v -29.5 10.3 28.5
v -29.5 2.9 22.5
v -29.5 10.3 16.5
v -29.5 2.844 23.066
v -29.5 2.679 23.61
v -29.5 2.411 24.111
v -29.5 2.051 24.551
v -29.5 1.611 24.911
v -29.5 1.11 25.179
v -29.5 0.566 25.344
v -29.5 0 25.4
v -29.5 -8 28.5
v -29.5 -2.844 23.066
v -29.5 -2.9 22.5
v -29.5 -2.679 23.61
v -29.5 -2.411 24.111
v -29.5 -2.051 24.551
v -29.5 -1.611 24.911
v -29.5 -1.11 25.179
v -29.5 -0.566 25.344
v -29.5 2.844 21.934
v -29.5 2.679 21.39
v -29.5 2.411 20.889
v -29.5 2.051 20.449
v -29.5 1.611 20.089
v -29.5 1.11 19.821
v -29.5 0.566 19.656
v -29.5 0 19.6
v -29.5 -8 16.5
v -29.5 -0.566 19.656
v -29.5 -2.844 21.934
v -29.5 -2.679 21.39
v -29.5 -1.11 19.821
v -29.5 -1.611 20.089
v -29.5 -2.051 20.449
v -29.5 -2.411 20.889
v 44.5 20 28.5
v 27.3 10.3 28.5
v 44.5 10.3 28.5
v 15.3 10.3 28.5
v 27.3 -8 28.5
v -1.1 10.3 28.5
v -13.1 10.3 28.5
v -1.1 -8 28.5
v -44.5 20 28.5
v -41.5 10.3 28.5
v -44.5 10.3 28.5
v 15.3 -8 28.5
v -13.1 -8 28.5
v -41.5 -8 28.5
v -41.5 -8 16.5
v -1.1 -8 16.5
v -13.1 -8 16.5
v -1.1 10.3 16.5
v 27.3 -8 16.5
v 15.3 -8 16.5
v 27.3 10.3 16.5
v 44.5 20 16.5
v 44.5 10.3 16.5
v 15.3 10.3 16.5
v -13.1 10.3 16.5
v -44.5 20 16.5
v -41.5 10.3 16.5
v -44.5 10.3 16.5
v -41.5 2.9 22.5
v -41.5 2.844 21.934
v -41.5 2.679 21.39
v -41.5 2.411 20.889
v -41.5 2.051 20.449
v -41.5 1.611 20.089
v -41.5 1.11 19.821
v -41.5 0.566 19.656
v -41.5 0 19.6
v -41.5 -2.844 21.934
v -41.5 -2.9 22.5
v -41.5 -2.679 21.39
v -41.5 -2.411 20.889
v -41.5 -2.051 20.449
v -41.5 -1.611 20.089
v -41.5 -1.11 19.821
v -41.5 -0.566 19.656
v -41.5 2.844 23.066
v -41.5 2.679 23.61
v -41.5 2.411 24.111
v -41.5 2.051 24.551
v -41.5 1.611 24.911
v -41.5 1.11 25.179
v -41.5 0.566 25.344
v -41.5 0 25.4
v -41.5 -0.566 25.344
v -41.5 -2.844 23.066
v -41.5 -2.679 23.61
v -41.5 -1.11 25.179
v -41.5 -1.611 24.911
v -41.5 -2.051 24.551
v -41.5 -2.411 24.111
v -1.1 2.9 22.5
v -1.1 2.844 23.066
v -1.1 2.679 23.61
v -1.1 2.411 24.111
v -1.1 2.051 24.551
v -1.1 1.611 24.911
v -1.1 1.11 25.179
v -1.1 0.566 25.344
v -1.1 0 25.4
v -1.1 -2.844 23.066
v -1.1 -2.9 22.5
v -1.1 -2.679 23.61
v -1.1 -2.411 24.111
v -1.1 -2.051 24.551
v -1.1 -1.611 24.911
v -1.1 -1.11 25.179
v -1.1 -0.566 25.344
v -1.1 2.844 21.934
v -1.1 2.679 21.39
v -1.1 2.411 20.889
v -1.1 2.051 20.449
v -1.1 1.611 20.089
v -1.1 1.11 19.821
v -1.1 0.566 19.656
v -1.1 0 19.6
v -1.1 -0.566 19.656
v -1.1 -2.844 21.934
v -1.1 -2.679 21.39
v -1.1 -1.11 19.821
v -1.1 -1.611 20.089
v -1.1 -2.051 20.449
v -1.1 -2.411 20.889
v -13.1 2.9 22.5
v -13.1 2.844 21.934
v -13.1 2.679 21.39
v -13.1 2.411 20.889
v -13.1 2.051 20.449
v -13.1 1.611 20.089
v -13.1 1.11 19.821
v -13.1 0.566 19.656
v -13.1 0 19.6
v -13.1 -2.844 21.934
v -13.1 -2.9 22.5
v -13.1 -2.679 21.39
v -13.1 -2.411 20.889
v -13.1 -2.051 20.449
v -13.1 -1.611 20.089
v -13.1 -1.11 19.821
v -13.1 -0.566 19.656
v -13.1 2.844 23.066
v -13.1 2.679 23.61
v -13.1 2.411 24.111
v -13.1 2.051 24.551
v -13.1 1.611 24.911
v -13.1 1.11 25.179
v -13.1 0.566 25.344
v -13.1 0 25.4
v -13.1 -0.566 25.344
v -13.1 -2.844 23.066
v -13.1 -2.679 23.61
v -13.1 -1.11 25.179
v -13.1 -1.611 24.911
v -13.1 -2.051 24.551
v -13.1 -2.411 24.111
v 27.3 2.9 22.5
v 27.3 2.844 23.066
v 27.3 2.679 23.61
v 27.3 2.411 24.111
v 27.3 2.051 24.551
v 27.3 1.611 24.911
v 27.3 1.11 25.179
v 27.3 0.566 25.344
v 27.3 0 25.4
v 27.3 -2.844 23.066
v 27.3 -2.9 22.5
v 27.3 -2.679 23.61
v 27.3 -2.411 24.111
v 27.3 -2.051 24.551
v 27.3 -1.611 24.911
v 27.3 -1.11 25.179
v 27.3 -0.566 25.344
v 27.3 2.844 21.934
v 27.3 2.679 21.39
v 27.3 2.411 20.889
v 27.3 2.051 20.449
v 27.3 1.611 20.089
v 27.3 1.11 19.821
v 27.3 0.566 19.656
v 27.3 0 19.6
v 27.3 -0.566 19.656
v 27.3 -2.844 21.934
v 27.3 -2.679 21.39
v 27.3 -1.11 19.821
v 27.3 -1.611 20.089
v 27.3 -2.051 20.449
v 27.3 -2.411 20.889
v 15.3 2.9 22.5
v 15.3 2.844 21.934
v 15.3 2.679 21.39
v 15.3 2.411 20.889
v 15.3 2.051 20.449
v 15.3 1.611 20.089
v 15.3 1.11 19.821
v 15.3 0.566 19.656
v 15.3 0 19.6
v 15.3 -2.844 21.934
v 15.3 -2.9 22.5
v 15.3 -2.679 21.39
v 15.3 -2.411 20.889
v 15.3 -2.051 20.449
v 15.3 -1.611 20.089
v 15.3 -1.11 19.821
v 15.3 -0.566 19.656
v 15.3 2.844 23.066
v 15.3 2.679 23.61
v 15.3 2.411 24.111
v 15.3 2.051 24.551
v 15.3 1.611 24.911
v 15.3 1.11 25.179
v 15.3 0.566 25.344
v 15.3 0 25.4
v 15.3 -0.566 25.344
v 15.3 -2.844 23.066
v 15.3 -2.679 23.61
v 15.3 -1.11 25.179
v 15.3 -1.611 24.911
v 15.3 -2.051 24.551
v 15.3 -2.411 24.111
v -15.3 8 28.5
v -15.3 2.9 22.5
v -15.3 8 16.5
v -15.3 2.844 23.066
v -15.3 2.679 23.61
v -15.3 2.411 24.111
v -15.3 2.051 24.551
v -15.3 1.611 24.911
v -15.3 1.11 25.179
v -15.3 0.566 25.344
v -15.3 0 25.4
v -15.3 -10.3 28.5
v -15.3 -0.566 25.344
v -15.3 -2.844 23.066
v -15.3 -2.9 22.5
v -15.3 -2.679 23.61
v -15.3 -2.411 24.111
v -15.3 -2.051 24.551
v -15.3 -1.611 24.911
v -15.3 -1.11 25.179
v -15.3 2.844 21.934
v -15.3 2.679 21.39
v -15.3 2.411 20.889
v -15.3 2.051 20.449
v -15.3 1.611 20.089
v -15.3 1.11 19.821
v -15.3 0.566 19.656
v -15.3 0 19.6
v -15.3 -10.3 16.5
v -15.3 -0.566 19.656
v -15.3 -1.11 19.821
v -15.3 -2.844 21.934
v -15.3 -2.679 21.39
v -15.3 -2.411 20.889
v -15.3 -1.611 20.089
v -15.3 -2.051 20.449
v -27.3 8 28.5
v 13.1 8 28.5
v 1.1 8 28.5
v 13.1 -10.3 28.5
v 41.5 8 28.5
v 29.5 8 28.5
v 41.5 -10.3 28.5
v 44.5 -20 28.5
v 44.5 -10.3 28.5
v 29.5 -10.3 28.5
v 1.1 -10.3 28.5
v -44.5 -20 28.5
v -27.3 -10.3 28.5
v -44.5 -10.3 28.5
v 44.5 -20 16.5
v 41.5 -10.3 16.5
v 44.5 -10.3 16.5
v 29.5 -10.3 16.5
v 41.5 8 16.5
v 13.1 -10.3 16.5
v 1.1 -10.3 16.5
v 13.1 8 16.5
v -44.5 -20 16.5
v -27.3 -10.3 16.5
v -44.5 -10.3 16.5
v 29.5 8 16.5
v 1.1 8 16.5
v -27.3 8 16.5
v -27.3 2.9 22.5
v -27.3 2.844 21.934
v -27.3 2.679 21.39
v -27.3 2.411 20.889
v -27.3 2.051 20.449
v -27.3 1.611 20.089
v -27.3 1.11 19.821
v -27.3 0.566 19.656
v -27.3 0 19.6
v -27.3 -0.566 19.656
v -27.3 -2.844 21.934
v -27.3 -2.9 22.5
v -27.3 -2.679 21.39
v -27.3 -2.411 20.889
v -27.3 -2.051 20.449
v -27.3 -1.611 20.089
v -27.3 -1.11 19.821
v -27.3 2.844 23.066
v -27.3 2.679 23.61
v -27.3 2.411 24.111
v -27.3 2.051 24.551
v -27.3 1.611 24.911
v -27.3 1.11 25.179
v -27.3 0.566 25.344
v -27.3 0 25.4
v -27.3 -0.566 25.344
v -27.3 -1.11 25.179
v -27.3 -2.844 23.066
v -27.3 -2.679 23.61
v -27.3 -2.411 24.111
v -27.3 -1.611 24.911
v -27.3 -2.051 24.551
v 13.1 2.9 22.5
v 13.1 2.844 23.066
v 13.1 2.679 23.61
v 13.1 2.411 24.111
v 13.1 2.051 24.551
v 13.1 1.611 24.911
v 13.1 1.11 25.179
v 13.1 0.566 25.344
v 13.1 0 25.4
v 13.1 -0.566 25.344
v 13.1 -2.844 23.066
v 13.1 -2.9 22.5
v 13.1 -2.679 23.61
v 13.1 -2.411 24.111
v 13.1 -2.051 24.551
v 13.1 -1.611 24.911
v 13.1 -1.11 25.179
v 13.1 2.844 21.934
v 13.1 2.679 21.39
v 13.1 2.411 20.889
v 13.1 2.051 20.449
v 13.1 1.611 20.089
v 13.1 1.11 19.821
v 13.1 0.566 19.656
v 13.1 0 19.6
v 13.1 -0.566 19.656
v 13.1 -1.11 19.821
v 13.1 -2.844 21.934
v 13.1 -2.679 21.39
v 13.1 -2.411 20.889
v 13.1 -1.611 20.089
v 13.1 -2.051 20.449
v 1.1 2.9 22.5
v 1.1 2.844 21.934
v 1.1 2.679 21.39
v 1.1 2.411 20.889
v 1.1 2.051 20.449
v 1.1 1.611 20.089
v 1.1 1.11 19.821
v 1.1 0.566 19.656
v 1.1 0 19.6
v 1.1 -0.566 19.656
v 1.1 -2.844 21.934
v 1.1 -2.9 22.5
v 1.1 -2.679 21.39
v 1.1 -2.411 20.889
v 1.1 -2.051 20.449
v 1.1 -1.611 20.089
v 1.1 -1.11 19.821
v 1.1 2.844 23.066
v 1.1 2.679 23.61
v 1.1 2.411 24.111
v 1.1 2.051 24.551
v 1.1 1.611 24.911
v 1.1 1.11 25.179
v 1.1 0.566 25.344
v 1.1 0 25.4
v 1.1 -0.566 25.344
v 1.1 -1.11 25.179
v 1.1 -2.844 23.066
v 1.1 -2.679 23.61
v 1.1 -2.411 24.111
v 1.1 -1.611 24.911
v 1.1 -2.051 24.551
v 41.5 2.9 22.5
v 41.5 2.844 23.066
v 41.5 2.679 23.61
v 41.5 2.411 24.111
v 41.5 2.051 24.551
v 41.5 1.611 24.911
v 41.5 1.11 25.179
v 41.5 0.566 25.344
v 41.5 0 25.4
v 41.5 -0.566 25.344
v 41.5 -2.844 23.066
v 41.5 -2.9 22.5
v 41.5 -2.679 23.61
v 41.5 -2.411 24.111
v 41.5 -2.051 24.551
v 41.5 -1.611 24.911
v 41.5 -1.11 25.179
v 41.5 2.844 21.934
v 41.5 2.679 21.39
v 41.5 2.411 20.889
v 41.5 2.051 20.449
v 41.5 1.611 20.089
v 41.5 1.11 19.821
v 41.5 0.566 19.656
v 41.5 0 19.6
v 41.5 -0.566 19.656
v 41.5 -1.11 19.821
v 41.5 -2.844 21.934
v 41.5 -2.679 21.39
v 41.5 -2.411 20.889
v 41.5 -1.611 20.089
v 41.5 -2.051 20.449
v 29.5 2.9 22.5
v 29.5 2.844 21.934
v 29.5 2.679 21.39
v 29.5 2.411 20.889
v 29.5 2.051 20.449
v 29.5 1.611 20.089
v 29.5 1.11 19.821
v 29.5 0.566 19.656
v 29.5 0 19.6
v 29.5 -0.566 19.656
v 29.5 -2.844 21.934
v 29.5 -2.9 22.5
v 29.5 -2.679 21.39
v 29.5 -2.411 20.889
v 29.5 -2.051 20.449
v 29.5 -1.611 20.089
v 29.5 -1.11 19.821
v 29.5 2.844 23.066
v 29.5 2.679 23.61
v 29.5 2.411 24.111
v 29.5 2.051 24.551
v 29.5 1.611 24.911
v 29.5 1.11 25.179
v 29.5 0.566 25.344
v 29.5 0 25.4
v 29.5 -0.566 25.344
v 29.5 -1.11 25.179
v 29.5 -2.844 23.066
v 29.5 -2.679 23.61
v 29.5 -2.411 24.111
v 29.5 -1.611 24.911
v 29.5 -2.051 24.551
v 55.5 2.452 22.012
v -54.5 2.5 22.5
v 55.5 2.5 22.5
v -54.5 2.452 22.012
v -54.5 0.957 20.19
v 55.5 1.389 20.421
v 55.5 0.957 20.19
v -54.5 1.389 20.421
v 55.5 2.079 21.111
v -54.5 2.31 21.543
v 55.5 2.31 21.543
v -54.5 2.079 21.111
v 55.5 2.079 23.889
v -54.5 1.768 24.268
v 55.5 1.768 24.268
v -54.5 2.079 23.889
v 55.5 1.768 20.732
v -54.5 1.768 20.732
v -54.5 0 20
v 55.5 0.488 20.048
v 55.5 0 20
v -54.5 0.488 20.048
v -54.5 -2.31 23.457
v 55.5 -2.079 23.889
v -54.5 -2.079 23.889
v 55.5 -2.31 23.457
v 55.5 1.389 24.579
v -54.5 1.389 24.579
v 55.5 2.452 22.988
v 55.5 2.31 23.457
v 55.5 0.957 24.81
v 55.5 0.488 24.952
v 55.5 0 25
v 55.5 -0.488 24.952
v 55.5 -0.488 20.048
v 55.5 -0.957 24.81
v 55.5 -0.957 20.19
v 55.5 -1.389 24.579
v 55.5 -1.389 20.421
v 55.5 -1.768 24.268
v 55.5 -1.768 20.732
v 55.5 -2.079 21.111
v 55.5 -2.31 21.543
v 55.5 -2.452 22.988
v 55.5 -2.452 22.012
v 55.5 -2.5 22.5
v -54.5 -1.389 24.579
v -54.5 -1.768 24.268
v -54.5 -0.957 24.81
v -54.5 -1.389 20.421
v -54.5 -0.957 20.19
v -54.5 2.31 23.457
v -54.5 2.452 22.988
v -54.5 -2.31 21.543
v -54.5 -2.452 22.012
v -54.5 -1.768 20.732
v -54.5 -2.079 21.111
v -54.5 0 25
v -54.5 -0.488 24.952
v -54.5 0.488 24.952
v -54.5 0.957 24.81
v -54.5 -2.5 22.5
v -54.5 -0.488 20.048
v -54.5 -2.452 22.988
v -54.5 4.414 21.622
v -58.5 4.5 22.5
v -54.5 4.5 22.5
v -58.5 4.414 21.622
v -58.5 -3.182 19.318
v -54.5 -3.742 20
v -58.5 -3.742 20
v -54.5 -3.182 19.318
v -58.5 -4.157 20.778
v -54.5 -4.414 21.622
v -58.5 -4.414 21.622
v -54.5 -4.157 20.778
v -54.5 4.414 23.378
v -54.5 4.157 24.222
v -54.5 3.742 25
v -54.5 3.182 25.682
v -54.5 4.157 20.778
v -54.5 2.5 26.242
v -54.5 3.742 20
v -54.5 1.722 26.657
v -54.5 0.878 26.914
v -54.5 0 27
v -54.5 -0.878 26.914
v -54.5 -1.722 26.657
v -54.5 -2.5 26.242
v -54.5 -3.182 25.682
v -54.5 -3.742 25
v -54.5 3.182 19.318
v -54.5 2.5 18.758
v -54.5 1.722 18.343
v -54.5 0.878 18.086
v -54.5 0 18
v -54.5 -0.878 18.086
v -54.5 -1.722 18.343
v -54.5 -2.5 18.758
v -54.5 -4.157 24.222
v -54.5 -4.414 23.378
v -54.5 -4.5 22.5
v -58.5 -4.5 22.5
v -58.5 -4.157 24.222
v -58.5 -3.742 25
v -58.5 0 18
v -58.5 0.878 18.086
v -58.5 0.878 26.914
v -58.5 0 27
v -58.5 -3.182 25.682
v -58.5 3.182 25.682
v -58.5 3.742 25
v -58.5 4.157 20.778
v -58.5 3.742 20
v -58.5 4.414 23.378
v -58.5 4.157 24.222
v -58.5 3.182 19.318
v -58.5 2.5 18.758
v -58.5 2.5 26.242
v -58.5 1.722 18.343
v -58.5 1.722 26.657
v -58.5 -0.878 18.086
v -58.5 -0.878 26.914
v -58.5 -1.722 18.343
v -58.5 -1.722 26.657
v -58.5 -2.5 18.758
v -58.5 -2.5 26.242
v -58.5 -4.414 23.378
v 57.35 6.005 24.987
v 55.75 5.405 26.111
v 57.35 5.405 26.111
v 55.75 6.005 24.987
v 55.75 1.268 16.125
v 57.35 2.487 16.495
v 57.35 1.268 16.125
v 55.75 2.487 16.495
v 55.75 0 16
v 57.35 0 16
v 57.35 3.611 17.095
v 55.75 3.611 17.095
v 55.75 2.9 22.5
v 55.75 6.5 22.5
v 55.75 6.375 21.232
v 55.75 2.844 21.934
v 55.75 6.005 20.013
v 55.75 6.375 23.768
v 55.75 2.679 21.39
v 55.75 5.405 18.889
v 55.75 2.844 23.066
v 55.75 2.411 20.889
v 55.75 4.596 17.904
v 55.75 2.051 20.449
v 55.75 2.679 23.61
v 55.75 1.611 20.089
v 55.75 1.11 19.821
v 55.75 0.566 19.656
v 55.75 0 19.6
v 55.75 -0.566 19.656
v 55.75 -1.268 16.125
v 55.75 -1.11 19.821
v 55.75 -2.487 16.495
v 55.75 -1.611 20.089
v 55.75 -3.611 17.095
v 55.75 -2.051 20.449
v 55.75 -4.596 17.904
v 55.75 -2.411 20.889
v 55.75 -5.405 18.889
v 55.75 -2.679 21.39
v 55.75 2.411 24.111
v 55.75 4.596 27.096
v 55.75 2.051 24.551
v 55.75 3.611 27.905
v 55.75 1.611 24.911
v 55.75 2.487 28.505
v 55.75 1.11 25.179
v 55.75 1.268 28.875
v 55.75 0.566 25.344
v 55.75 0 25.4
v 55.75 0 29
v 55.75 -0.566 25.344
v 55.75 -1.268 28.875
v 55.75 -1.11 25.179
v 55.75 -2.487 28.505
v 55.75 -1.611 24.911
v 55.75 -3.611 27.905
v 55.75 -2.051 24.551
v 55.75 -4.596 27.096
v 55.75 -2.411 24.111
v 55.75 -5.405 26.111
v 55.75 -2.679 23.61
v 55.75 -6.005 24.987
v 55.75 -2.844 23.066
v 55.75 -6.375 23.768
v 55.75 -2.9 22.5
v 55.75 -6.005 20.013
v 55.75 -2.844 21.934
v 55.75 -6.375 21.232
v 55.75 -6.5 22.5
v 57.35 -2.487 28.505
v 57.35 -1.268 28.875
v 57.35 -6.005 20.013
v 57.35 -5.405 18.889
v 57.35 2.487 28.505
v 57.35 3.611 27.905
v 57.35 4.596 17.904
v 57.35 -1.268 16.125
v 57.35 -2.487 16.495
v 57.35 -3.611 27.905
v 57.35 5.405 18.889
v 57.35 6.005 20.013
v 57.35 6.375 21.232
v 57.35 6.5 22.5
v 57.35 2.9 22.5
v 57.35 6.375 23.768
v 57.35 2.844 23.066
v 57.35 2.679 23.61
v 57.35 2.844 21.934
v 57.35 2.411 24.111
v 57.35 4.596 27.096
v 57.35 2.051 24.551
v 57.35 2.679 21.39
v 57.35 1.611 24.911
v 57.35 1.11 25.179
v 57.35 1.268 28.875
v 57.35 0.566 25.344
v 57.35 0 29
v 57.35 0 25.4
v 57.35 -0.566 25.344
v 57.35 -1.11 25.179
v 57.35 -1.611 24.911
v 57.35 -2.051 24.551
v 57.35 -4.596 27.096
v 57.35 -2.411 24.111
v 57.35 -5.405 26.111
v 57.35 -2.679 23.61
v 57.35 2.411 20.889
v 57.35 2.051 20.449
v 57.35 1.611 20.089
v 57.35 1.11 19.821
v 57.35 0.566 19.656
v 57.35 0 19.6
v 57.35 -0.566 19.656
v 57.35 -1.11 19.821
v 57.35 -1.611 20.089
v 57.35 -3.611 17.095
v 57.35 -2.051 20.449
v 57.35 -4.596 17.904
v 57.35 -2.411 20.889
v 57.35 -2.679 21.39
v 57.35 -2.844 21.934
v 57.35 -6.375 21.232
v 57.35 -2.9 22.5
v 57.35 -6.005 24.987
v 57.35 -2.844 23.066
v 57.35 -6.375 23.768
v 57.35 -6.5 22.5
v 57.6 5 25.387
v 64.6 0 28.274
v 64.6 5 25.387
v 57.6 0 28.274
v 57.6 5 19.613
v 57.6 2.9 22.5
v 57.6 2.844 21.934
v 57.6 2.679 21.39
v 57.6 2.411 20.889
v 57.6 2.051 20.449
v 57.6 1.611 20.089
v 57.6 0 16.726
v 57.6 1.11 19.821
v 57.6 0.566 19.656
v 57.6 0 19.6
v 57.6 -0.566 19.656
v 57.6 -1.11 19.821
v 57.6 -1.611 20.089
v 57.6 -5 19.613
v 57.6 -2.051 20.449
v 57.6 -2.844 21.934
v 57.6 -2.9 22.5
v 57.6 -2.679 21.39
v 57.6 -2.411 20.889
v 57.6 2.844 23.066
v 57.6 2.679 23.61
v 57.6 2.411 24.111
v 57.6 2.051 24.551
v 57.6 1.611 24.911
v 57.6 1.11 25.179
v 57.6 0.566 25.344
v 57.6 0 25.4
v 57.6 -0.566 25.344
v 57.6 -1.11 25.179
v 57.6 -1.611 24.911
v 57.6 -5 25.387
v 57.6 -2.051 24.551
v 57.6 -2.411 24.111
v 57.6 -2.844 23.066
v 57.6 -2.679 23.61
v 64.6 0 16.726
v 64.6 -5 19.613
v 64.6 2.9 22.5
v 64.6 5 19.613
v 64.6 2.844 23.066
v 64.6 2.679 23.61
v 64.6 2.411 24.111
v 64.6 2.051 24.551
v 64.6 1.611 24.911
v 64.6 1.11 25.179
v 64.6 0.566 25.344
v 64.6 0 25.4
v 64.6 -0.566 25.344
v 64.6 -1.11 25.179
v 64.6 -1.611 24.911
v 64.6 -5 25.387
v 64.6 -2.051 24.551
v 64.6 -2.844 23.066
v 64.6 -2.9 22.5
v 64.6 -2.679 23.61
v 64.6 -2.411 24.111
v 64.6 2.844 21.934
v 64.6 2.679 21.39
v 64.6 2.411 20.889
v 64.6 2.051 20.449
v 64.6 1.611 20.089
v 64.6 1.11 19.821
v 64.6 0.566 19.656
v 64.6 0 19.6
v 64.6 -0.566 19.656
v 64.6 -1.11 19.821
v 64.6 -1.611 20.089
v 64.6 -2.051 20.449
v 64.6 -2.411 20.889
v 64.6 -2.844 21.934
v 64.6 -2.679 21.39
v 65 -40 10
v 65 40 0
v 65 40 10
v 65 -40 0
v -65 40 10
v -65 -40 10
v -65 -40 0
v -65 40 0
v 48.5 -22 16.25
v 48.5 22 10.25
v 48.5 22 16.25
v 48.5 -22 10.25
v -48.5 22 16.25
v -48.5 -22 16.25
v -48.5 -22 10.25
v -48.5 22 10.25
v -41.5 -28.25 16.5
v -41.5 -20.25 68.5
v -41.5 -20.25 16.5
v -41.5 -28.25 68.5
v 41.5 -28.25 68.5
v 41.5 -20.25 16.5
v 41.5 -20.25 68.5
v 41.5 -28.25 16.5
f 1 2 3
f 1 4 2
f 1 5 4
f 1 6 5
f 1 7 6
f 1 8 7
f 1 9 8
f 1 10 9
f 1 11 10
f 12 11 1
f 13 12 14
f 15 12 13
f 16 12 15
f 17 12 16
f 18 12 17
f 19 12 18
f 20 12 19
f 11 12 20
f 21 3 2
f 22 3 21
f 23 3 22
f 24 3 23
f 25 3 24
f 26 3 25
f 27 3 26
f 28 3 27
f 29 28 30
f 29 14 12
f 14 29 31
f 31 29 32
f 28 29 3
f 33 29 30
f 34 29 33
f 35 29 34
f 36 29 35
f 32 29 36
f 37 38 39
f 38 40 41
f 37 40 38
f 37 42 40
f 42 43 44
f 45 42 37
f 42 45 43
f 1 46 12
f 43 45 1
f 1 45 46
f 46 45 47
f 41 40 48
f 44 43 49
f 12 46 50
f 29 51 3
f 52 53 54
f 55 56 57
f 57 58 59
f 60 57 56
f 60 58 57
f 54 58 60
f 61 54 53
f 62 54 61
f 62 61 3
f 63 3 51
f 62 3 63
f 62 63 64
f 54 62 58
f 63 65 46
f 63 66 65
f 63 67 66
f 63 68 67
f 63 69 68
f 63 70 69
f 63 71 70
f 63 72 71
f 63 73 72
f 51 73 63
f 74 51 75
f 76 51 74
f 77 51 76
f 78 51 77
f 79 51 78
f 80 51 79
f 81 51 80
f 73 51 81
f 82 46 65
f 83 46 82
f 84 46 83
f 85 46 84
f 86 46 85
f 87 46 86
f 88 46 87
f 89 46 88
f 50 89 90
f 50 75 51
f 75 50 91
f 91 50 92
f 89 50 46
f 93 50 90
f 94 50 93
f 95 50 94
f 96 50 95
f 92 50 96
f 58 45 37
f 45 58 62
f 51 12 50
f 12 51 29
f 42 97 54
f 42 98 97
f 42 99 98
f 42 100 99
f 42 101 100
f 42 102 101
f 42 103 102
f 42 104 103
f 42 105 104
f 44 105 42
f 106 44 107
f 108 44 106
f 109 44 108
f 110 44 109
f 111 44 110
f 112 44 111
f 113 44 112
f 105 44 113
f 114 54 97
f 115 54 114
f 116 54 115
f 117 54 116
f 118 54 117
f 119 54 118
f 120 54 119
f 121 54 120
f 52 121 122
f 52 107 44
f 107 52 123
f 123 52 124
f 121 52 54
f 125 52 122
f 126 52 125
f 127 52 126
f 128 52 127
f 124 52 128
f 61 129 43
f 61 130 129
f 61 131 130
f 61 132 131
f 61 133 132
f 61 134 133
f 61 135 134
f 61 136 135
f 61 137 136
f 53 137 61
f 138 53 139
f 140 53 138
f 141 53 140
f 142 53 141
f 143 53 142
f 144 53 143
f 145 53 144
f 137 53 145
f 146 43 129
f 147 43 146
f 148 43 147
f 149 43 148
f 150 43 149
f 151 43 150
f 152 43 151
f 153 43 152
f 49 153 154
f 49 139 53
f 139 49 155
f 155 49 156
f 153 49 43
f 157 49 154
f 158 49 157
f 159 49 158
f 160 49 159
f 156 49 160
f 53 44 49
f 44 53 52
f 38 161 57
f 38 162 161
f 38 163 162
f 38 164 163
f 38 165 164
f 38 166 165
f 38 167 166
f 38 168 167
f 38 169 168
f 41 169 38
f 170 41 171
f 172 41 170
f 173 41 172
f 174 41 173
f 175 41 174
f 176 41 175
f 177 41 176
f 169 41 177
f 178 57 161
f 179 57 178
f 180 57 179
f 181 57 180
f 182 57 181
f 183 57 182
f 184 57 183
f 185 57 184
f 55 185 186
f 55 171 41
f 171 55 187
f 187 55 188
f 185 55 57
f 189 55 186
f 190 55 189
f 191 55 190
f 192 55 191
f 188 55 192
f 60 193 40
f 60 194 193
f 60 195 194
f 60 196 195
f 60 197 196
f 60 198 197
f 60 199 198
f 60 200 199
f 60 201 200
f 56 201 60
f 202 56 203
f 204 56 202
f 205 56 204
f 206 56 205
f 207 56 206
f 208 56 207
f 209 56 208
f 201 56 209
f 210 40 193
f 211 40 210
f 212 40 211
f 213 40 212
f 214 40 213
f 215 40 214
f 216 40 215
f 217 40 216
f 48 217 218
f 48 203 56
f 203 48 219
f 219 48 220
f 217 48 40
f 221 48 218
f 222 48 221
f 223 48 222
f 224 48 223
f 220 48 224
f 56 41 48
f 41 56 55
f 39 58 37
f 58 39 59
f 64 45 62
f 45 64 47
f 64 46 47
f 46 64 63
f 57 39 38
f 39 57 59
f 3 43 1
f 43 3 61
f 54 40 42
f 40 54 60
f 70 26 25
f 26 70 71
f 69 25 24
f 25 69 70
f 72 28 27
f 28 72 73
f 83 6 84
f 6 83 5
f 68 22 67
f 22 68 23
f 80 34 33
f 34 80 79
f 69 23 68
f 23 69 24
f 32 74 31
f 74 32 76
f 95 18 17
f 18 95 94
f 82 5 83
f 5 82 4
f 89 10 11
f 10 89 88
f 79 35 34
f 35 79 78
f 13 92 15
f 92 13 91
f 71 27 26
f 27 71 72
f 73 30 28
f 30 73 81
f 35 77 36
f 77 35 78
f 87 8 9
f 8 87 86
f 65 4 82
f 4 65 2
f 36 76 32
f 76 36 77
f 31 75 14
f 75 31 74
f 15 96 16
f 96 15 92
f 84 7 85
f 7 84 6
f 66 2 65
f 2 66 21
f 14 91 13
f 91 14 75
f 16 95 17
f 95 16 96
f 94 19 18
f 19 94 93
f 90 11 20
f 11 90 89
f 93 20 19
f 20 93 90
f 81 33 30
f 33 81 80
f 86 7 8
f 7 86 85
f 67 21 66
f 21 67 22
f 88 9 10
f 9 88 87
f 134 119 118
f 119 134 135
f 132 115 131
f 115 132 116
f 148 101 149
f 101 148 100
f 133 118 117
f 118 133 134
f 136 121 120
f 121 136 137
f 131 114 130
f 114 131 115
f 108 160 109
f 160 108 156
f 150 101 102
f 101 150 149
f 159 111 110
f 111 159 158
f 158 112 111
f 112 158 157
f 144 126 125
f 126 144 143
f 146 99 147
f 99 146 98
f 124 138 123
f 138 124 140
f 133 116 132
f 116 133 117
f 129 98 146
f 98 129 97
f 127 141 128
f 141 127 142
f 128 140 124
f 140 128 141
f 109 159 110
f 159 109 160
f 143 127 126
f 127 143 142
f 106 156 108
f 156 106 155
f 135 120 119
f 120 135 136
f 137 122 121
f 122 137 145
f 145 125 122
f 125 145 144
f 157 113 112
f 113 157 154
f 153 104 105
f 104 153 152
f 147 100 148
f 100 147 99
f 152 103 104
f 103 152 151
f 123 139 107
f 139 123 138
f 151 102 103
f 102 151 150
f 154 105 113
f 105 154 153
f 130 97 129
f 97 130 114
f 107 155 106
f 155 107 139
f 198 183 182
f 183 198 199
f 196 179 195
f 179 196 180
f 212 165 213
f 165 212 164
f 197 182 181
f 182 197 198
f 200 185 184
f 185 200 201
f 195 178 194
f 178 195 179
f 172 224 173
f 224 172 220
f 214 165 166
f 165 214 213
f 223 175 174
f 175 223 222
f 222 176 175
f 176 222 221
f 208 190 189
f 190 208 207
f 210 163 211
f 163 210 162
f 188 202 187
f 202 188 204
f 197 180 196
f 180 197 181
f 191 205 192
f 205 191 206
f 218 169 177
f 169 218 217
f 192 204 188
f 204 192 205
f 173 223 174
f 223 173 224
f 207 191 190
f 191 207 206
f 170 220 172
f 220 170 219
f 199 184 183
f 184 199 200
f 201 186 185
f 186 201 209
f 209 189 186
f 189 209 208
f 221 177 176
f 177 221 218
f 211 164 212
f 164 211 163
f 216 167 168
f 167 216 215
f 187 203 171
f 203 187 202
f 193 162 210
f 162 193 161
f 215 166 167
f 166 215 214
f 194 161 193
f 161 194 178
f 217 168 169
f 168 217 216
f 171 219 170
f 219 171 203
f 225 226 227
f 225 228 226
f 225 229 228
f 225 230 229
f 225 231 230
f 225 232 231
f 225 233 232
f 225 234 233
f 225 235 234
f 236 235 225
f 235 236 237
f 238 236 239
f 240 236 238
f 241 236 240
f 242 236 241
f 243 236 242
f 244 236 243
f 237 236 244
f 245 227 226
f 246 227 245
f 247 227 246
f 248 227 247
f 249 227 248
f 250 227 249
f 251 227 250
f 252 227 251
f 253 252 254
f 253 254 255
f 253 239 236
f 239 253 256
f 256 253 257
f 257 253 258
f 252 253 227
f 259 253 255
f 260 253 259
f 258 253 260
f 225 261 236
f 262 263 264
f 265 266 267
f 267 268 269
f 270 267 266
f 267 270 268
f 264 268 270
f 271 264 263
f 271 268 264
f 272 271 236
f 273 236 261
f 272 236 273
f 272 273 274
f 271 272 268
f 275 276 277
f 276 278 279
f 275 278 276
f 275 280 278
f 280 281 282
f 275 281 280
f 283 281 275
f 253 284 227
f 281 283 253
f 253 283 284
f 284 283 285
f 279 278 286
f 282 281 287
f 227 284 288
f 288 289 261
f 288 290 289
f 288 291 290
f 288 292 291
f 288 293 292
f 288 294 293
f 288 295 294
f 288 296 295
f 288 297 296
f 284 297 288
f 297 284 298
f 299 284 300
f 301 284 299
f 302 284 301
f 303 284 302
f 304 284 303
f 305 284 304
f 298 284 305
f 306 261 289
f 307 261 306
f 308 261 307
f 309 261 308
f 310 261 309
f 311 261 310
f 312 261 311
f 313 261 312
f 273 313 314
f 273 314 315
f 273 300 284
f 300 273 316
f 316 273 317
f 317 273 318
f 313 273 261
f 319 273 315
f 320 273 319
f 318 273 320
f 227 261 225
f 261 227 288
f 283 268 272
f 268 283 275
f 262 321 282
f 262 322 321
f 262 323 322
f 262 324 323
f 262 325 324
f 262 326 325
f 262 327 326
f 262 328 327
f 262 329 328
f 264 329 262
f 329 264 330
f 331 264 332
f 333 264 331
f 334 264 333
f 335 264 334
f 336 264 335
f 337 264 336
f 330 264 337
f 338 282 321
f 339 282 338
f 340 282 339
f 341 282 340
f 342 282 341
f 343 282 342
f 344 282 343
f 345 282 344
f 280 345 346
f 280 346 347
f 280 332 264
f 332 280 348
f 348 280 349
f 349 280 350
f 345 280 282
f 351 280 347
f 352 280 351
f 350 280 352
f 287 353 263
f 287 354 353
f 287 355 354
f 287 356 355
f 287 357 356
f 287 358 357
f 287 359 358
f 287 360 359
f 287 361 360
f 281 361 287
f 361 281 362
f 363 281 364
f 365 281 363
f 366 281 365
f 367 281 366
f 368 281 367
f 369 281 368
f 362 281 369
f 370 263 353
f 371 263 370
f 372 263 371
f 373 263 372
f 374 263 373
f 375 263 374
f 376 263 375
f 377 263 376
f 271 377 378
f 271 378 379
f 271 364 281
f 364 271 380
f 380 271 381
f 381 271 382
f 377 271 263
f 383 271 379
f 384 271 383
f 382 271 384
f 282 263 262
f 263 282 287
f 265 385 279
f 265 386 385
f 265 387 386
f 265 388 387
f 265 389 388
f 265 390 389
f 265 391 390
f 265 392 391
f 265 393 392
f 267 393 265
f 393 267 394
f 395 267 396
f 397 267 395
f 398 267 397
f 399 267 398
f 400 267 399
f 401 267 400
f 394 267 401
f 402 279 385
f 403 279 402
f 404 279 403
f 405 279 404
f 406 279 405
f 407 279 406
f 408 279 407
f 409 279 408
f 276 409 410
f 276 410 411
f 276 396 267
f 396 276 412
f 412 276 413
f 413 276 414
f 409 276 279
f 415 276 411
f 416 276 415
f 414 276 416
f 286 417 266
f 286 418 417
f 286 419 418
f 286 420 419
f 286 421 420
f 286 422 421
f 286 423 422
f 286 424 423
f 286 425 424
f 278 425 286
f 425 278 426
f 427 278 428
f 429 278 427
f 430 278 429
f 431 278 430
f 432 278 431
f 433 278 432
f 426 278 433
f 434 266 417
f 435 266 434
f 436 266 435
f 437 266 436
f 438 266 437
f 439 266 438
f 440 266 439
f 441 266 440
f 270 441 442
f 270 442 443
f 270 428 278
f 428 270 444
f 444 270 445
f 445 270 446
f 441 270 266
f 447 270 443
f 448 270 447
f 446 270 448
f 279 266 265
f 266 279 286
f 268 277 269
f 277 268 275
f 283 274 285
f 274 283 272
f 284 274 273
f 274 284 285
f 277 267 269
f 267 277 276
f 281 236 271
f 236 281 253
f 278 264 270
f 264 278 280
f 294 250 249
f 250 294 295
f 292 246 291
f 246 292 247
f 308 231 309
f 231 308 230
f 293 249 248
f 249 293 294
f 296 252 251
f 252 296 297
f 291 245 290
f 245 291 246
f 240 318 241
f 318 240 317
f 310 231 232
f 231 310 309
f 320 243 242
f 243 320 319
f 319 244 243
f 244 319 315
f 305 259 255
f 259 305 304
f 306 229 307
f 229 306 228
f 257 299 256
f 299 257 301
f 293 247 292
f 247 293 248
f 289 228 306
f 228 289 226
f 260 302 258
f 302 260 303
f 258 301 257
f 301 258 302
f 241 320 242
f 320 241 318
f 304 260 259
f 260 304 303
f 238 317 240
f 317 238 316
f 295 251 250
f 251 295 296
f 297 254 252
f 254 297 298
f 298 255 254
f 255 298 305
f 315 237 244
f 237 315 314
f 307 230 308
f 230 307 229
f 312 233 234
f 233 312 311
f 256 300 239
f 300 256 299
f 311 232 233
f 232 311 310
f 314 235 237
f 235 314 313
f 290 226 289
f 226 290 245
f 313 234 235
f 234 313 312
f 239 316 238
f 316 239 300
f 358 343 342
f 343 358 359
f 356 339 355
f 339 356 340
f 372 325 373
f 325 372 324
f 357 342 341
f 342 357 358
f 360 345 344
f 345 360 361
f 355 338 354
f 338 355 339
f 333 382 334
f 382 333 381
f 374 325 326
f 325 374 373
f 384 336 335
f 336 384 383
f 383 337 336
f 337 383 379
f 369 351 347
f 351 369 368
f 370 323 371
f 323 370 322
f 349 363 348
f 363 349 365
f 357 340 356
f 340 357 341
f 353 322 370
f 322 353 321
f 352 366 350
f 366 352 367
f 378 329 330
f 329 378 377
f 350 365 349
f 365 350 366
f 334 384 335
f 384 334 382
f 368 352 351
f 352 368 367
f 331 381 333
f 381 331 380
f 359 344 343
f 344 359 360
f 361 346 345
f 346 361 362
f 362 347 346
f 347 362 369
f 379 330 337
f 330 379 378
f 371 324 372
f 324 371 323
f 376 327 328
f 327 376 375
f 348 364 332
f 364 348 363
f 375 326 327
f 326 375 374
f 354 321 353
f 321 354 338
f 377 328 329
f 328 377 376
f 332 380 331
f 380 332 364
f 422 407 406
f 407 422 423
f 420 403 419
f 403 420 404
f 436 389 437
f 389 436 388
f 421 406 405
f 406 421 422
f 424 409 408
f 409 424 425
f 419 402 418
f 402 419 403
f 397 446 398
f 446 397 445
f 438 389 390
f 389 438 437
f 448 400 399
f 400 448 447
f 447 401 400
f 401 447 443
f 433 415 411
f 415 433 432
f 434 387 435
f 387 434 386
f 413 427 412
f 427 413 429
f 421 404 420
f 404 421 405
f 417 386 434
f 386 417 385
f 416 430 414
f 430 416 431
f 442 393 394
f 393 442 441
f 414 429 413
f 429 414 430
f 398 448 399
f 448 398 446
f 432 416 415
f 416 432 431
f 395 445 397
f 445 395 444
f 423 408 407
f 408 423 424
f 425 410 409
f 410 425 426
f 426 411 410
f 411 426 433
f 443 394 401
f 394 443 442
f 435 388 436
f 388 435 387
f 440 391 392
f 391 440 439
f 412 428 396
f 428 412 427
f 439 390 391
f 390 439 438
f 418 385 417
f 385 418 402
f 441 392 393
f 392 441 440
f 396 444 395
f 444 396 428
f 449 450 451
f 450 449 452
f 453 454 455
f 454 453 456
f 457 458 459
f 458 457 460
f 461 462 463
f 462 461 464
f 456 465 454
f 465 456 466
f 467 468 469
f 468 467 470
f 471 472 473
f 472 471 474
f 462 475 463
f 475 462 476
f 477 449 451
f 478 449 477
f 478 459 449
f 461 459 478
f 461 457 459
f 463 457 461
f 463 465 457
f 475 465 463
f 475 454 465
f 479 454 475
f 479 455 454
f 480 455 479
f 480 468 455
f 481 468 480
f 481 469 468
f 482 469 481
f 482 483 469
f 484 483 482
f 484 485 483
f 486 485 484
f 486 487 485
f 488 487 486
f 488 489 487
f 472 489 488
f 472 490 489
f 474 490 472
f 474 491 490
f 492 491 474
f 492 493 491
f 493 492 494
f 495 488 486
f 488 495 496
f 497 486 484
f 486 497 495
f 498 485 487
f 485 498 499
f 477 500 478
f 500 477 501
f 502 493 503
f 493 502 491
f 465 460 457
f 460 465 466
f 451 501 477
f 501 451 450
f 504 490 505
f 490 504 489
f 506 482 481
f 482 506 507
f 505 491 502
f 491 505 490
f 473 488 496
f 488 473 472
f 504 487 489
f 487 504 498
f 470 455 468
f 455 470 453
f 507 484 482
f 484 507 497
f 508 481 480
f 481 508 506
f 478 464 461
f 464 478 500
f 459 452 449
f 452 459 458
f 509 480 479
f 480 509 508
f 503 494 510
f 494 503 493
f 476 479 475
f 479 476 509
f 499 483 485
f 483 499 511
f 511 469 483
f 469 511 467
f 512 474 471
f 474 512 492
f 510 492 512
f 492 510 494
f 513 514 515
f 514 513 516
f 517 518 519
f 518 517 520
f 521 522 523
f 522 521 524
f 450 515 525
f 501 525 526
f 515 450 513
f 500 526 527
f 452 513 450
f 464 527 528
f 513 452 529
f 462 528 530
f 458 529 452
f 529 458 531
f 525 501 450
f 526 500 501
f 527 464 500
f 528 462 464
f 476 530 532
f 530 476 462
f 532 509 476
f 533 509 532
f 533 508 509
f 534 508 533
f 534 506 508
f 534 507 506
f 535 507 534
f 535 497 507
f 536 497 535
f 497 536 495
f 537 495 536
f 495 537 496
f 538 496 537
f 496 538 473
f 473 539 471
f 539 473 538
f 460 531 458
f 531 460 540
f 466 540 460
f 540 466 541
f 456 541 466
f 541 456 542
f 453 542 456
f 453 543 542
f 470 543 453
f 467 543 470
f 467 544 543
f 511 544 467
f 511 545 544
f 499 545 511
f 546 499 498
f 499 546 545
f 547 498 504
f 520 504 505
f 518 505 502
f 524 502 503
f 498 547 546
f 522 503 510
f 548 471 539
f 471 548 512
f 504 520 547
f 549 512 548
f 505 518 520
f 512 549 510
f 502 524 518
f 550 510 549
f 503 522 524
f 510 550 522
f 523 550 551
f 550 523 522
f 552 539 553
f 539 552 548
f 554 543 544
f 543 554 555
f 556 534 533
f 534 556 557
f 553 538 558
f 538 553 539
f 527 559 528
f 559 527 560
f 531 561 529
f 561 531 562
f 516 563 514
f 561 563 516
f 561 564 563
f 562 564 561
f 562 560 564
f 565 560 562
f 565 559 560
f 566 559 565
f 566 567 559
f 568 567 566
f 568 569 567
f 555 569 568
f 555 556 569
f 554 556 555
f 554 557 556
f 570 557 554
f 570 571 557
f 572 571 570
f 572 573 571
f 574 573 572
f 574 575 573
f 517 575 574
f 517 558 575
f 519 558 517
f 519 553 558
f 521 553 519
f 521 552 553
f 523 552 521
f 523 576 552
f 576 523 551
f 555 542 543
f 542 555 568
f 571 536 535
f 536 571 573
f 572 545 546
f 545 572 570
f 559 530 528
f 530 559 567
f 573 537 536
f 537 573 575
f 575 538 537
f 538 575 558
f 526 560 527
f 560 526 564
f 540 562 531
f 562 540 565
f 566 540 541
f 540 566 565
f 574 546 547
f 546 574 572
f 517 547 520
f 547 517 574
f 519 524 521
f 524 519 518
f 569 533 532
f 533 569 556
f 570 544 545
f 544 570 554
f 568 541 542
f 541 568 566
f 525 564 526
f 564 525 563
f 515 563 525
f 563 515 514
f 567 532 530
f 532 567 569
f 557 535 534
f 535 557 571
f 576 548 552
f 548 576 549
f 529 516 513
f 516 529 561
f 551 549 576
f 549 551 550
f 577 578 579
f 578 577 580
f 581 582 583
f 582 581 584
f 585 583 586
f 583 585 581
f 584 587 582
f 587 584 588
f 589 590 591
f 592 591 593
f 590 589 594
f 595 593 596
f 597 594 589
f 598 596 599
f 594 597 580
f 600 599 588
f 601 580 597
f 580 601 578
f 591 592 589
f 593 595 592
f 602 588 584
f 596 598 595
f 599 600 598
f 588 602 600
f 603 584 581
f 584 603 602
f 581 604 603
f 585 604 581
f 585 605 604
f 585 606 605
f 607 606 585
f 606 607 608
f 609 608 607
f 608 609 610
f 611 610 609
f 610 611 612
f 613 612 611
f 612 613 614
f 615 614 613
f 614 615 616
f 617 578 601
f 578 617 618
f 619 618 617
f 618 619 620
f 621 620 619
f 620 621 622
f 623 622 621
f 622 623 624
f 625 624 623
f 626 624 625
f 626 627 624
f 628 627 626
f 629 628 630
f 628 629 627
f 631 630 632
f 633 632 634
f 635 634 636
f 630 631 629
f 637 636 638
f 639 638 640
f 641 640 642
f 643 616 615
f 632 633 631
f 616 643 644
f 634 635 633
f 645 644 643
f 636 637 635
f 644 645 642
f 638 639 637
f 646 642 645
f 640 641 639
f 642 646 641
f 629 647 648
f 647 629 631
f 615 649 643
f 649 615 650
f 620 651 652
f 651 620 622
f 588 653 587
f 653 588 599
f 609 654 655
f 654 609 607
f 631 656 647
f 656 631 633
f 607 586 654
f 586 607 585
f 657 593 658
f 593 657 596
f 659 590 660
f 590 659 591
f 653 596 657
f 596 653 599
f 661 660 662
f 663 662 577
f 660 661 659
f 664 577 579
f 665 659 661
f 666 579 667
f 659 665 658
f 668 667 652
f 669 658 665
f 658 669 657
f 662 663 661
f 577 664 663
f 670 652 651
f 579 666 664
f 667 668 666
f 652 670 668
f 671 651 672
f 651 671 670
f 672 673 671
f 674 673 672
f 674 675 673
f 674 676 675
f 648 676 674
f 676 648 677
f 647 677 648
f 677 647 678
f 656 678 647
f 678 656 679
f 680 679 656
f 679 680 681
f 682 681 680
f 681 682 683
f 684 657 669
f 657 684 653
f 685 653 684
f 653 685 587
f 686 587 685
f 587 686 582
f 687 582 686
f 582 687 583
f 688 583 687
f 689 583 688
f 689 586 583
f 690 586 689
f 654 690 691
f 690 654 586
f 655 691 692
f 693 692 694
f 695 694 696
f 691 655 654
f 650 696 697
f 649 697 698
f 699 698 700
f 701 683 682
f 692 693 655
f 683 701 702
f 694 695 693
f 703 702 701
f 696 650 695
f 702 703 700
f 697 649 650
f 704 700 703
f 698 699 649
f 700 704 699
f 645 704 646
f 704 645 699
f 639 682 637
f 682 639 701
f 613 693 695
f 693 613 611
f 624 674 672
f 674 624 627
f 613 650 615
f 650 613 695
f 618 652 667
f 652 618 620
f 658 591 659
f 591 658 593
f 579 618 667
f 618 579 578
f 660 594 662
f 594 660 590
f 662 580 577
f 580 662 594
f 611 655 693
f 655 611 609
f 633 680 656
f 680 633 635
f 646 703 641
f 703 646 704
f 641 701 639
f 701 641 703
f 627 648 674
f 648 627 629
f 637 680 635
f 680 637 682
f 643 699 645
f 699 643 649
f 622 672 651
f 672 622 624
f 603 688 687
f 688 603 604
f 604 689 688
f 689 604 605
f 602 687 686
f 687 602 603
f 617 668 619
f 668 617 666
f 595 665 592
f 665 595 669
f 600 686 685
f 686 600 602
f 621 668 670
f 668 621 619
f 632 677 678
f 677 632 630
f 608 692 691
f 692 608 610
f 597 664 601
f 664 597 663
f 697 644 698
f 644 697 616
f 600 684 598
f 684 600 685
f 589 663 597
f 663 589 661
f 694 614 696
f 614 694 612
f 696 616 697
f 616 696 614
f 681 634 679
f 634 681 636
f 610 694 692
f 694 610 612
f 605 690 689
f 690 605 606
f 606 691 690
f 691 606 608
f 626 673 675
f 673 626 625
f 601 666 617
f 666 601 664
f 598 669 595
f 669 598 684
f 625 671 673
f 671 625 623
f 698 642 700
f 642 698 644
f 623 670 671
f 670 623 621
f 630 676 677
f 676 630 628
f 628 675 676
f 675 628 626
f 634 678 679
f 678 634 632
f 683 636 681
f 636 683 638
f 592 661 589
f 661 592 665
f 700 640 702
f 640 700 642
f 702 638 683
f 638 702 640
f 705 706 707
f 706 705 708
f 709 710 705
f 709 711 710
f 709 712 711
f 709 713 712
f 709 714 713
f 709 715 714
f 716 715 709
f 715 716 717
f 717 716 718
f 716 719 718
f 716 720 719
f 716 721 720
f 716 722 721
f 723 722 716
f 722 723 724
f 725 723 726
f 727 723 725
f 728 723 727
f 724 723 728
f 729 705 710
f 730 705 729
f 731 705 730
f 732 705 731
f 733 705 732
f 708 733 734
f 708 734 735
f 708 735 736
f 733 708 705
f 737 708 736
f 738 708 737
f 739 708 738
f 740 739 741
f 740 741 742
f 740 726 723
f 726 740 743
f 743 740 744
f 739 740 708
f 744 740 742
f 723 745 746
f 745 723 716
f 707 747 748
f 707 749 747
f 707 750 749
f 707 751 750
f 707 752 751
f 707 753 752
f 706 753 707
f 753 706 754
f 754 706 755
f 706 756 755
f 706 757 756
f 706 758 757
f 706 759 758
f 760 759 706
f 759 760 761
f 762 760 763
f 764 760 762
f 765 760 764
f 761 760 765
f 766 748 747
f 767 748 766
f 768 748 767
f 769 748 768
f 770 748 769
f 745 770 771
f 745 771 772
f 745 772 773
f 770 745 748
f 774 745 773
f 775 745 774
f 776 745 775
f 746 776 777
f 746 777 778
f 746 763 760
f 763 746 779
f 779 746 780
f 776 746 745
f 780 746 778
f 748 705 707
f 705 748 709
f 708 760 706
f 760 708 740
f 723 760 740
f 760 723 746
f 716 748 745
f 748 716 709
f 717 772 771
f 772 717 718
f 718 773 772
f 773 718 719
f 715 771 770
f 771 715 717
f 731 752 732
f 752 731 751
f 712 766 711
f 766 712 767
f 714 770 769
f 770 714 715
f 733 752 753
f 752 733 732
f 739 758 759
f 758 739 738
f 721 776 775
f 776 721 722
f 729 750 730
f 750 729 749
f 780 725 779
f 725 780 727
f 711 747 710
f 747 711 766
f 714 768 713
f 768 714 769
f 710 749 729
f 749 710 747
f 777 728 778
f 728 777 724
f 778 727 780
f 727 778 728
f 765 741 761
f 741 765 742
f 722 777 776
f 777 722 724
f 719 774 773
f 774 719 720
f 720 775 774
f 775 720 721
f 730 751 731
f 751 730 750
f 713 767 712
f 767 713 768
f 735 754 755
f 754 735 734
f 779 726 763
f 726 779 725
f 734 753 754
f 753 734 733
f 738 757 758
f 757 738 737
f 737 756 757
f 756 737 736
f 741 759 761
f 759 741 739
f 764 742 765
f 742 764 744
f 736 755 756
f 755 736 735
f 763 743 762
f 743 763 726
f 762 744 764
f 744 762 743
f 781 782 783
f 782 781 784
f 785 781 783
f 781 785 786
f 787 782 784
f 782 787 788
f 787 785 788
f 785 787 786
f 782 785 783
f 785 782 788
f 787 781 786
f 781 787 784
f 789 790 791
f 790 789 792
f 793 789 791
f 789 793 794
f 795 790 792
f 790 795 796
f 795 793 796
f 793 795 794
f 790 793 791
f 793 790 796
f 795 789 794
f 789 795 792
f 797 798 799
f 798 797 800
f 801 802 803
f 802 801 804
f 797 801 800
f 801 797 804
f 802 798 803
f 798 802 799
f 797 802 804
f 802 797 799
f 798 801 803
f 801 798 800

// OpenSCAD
$fn = 32;

// ------------------------------------------------------------------------
// Comb hinge with flap: leaf 89 x 20 mm, pin d5, flap 52 mm
// Every part is its own module, assembly() places every instance.
// ------------------------------------------------------------------------

// --- part 1 ---
module hinge_bed() {
  difference() {
    translate([-65, -40, 0]) cube([130, 80, 10]);
  }
}

// --- part 2 ---
module hinge_riser() {
  difference() {
    translate([-48.5, -22, 0]) cube([97, 44, 6]);
  }
}

// --- part 3 ---
module hinge_leaf_a() {
  difference() {
    union() {
      translate([-41.5, -8, -6]) cube([12, 28, 12]);
      translate([-13.1, -8, -6]) cube([12, 28, 12]);
      translate([15.3, -8, -6]) cube([12, 28, 12]);
      translate([-44.5, 10.3, -6]) cube([89, 9.7, 12]);
    }
    translate([-35.5, 0, 0]) rotate([0, 90, 0]) cylinder(h = 14, d = 5.8, center = true);
    translate([-7.1, 0, 0]) rotate([0, 90, 0]) cylinder(h = 14, d = 5.8, center = true);
    translate([21.3, 0, 0]) rotate([0, 90, 0]) cylinder(h = 14, d = 5.8, center = true);
  }
}

// --- part 4 ---
module hinge_leaf_b() {
  difference() {
    union() {
      translate([-27.3, -20, -6]) cube([12, 28, 12]);
      translate([1.1, -20, -6]) cube([12, 28, 12]);
      translate([29.5, -20, -6]) cube([12, 28, 12]);
      translate([-44.5, -20, -6]) cube([89, 9.7, 12]);
    }
    translate([-21.3, 0, 0]) rotate([0, 90, 0]) cylinder(h = 14, d = 5.8, center = true);
    translate([7.1, 0, 0]) rotate([0, 90, 0]) cylinder(h = 14, d = 5.8, center = true);
    translate([35.5, 0, 0]) rotate([0, 90, 0]) cylinder(h = 14, d = 5.8, center = true);
  }
}

// --- part 5 ---
module hinge_flap() {
  difference() {
    translate([-41.5, -26, 0]) cube([83, 52, 8]);
  }
}

// --- part 6 ---
module hinge_pin() {
  rotate([0, 90, 0]) cylinder(h = 111, d = 5, center = true);
  translate([-58.5, 0, 0]) rotate([0, 90, 0]) cylinder(h = 4, d = 9);
}

// --- part 7 ---
module pin_washer() {
  difference() {
      translate([0, 0, 0]) cylinder(h = 1.6, d = 13);
      translate([0, 0, -1]) cylinder(h = 3.6, d = 5.8);
    }
}

// --- part 8 ---
module pin_nut() {
  difference() {
    linear_extrude(height = 7) polygon(points = [[5.774, 0], [2.887, 5], [-2.887, 5], [-5.774, 0], [-2.887, -5], [2.887, -5]]);
    translate([0, 0, -1]) cylinder(h = 9, d = 5.8);
  }
}

// --- assembly ---
module assembly() {
  color([0.80, 0.24, 0.20]) translate([0, 0, 0]) rotate([0, 0, 0]) hinge_bed();
  color([0.20, 0.45, 0.75]) translate([0, 0, 10.25]) rotate([0, 0, 0]) hinge_riser();
  color([0.25, 0.62, 0.32]) translate([0, 0, 22.5]) rotate([0, 0, 0]) hinge_leaf_a();
  color([0.92, 0.70, 0.18]) translate([0, 0, 22.5]) rotate([0, 0, 0]) hinge_leaf_b();
  color([0.58, 0.35, 0.70]) translate([0, -20.25, 42.5]) rotate([90, 0, 0]) hinge_flap();
  color([0.16, 0.66, 0.66]) translate([0, 0, 22.5]) rotate([0, 0, 0]) hinge_pin();
  color([0.85, 0.48, 0.18]) translate([55.75, 0, 22.5]) rotate([0, 90, 0]) pin_washer();
  color([0.55, 0.60, 0.65]) translate([57.6, 0, 22.5]) rotate([0, 90, 0]) pin_nut();
}

assembly();
